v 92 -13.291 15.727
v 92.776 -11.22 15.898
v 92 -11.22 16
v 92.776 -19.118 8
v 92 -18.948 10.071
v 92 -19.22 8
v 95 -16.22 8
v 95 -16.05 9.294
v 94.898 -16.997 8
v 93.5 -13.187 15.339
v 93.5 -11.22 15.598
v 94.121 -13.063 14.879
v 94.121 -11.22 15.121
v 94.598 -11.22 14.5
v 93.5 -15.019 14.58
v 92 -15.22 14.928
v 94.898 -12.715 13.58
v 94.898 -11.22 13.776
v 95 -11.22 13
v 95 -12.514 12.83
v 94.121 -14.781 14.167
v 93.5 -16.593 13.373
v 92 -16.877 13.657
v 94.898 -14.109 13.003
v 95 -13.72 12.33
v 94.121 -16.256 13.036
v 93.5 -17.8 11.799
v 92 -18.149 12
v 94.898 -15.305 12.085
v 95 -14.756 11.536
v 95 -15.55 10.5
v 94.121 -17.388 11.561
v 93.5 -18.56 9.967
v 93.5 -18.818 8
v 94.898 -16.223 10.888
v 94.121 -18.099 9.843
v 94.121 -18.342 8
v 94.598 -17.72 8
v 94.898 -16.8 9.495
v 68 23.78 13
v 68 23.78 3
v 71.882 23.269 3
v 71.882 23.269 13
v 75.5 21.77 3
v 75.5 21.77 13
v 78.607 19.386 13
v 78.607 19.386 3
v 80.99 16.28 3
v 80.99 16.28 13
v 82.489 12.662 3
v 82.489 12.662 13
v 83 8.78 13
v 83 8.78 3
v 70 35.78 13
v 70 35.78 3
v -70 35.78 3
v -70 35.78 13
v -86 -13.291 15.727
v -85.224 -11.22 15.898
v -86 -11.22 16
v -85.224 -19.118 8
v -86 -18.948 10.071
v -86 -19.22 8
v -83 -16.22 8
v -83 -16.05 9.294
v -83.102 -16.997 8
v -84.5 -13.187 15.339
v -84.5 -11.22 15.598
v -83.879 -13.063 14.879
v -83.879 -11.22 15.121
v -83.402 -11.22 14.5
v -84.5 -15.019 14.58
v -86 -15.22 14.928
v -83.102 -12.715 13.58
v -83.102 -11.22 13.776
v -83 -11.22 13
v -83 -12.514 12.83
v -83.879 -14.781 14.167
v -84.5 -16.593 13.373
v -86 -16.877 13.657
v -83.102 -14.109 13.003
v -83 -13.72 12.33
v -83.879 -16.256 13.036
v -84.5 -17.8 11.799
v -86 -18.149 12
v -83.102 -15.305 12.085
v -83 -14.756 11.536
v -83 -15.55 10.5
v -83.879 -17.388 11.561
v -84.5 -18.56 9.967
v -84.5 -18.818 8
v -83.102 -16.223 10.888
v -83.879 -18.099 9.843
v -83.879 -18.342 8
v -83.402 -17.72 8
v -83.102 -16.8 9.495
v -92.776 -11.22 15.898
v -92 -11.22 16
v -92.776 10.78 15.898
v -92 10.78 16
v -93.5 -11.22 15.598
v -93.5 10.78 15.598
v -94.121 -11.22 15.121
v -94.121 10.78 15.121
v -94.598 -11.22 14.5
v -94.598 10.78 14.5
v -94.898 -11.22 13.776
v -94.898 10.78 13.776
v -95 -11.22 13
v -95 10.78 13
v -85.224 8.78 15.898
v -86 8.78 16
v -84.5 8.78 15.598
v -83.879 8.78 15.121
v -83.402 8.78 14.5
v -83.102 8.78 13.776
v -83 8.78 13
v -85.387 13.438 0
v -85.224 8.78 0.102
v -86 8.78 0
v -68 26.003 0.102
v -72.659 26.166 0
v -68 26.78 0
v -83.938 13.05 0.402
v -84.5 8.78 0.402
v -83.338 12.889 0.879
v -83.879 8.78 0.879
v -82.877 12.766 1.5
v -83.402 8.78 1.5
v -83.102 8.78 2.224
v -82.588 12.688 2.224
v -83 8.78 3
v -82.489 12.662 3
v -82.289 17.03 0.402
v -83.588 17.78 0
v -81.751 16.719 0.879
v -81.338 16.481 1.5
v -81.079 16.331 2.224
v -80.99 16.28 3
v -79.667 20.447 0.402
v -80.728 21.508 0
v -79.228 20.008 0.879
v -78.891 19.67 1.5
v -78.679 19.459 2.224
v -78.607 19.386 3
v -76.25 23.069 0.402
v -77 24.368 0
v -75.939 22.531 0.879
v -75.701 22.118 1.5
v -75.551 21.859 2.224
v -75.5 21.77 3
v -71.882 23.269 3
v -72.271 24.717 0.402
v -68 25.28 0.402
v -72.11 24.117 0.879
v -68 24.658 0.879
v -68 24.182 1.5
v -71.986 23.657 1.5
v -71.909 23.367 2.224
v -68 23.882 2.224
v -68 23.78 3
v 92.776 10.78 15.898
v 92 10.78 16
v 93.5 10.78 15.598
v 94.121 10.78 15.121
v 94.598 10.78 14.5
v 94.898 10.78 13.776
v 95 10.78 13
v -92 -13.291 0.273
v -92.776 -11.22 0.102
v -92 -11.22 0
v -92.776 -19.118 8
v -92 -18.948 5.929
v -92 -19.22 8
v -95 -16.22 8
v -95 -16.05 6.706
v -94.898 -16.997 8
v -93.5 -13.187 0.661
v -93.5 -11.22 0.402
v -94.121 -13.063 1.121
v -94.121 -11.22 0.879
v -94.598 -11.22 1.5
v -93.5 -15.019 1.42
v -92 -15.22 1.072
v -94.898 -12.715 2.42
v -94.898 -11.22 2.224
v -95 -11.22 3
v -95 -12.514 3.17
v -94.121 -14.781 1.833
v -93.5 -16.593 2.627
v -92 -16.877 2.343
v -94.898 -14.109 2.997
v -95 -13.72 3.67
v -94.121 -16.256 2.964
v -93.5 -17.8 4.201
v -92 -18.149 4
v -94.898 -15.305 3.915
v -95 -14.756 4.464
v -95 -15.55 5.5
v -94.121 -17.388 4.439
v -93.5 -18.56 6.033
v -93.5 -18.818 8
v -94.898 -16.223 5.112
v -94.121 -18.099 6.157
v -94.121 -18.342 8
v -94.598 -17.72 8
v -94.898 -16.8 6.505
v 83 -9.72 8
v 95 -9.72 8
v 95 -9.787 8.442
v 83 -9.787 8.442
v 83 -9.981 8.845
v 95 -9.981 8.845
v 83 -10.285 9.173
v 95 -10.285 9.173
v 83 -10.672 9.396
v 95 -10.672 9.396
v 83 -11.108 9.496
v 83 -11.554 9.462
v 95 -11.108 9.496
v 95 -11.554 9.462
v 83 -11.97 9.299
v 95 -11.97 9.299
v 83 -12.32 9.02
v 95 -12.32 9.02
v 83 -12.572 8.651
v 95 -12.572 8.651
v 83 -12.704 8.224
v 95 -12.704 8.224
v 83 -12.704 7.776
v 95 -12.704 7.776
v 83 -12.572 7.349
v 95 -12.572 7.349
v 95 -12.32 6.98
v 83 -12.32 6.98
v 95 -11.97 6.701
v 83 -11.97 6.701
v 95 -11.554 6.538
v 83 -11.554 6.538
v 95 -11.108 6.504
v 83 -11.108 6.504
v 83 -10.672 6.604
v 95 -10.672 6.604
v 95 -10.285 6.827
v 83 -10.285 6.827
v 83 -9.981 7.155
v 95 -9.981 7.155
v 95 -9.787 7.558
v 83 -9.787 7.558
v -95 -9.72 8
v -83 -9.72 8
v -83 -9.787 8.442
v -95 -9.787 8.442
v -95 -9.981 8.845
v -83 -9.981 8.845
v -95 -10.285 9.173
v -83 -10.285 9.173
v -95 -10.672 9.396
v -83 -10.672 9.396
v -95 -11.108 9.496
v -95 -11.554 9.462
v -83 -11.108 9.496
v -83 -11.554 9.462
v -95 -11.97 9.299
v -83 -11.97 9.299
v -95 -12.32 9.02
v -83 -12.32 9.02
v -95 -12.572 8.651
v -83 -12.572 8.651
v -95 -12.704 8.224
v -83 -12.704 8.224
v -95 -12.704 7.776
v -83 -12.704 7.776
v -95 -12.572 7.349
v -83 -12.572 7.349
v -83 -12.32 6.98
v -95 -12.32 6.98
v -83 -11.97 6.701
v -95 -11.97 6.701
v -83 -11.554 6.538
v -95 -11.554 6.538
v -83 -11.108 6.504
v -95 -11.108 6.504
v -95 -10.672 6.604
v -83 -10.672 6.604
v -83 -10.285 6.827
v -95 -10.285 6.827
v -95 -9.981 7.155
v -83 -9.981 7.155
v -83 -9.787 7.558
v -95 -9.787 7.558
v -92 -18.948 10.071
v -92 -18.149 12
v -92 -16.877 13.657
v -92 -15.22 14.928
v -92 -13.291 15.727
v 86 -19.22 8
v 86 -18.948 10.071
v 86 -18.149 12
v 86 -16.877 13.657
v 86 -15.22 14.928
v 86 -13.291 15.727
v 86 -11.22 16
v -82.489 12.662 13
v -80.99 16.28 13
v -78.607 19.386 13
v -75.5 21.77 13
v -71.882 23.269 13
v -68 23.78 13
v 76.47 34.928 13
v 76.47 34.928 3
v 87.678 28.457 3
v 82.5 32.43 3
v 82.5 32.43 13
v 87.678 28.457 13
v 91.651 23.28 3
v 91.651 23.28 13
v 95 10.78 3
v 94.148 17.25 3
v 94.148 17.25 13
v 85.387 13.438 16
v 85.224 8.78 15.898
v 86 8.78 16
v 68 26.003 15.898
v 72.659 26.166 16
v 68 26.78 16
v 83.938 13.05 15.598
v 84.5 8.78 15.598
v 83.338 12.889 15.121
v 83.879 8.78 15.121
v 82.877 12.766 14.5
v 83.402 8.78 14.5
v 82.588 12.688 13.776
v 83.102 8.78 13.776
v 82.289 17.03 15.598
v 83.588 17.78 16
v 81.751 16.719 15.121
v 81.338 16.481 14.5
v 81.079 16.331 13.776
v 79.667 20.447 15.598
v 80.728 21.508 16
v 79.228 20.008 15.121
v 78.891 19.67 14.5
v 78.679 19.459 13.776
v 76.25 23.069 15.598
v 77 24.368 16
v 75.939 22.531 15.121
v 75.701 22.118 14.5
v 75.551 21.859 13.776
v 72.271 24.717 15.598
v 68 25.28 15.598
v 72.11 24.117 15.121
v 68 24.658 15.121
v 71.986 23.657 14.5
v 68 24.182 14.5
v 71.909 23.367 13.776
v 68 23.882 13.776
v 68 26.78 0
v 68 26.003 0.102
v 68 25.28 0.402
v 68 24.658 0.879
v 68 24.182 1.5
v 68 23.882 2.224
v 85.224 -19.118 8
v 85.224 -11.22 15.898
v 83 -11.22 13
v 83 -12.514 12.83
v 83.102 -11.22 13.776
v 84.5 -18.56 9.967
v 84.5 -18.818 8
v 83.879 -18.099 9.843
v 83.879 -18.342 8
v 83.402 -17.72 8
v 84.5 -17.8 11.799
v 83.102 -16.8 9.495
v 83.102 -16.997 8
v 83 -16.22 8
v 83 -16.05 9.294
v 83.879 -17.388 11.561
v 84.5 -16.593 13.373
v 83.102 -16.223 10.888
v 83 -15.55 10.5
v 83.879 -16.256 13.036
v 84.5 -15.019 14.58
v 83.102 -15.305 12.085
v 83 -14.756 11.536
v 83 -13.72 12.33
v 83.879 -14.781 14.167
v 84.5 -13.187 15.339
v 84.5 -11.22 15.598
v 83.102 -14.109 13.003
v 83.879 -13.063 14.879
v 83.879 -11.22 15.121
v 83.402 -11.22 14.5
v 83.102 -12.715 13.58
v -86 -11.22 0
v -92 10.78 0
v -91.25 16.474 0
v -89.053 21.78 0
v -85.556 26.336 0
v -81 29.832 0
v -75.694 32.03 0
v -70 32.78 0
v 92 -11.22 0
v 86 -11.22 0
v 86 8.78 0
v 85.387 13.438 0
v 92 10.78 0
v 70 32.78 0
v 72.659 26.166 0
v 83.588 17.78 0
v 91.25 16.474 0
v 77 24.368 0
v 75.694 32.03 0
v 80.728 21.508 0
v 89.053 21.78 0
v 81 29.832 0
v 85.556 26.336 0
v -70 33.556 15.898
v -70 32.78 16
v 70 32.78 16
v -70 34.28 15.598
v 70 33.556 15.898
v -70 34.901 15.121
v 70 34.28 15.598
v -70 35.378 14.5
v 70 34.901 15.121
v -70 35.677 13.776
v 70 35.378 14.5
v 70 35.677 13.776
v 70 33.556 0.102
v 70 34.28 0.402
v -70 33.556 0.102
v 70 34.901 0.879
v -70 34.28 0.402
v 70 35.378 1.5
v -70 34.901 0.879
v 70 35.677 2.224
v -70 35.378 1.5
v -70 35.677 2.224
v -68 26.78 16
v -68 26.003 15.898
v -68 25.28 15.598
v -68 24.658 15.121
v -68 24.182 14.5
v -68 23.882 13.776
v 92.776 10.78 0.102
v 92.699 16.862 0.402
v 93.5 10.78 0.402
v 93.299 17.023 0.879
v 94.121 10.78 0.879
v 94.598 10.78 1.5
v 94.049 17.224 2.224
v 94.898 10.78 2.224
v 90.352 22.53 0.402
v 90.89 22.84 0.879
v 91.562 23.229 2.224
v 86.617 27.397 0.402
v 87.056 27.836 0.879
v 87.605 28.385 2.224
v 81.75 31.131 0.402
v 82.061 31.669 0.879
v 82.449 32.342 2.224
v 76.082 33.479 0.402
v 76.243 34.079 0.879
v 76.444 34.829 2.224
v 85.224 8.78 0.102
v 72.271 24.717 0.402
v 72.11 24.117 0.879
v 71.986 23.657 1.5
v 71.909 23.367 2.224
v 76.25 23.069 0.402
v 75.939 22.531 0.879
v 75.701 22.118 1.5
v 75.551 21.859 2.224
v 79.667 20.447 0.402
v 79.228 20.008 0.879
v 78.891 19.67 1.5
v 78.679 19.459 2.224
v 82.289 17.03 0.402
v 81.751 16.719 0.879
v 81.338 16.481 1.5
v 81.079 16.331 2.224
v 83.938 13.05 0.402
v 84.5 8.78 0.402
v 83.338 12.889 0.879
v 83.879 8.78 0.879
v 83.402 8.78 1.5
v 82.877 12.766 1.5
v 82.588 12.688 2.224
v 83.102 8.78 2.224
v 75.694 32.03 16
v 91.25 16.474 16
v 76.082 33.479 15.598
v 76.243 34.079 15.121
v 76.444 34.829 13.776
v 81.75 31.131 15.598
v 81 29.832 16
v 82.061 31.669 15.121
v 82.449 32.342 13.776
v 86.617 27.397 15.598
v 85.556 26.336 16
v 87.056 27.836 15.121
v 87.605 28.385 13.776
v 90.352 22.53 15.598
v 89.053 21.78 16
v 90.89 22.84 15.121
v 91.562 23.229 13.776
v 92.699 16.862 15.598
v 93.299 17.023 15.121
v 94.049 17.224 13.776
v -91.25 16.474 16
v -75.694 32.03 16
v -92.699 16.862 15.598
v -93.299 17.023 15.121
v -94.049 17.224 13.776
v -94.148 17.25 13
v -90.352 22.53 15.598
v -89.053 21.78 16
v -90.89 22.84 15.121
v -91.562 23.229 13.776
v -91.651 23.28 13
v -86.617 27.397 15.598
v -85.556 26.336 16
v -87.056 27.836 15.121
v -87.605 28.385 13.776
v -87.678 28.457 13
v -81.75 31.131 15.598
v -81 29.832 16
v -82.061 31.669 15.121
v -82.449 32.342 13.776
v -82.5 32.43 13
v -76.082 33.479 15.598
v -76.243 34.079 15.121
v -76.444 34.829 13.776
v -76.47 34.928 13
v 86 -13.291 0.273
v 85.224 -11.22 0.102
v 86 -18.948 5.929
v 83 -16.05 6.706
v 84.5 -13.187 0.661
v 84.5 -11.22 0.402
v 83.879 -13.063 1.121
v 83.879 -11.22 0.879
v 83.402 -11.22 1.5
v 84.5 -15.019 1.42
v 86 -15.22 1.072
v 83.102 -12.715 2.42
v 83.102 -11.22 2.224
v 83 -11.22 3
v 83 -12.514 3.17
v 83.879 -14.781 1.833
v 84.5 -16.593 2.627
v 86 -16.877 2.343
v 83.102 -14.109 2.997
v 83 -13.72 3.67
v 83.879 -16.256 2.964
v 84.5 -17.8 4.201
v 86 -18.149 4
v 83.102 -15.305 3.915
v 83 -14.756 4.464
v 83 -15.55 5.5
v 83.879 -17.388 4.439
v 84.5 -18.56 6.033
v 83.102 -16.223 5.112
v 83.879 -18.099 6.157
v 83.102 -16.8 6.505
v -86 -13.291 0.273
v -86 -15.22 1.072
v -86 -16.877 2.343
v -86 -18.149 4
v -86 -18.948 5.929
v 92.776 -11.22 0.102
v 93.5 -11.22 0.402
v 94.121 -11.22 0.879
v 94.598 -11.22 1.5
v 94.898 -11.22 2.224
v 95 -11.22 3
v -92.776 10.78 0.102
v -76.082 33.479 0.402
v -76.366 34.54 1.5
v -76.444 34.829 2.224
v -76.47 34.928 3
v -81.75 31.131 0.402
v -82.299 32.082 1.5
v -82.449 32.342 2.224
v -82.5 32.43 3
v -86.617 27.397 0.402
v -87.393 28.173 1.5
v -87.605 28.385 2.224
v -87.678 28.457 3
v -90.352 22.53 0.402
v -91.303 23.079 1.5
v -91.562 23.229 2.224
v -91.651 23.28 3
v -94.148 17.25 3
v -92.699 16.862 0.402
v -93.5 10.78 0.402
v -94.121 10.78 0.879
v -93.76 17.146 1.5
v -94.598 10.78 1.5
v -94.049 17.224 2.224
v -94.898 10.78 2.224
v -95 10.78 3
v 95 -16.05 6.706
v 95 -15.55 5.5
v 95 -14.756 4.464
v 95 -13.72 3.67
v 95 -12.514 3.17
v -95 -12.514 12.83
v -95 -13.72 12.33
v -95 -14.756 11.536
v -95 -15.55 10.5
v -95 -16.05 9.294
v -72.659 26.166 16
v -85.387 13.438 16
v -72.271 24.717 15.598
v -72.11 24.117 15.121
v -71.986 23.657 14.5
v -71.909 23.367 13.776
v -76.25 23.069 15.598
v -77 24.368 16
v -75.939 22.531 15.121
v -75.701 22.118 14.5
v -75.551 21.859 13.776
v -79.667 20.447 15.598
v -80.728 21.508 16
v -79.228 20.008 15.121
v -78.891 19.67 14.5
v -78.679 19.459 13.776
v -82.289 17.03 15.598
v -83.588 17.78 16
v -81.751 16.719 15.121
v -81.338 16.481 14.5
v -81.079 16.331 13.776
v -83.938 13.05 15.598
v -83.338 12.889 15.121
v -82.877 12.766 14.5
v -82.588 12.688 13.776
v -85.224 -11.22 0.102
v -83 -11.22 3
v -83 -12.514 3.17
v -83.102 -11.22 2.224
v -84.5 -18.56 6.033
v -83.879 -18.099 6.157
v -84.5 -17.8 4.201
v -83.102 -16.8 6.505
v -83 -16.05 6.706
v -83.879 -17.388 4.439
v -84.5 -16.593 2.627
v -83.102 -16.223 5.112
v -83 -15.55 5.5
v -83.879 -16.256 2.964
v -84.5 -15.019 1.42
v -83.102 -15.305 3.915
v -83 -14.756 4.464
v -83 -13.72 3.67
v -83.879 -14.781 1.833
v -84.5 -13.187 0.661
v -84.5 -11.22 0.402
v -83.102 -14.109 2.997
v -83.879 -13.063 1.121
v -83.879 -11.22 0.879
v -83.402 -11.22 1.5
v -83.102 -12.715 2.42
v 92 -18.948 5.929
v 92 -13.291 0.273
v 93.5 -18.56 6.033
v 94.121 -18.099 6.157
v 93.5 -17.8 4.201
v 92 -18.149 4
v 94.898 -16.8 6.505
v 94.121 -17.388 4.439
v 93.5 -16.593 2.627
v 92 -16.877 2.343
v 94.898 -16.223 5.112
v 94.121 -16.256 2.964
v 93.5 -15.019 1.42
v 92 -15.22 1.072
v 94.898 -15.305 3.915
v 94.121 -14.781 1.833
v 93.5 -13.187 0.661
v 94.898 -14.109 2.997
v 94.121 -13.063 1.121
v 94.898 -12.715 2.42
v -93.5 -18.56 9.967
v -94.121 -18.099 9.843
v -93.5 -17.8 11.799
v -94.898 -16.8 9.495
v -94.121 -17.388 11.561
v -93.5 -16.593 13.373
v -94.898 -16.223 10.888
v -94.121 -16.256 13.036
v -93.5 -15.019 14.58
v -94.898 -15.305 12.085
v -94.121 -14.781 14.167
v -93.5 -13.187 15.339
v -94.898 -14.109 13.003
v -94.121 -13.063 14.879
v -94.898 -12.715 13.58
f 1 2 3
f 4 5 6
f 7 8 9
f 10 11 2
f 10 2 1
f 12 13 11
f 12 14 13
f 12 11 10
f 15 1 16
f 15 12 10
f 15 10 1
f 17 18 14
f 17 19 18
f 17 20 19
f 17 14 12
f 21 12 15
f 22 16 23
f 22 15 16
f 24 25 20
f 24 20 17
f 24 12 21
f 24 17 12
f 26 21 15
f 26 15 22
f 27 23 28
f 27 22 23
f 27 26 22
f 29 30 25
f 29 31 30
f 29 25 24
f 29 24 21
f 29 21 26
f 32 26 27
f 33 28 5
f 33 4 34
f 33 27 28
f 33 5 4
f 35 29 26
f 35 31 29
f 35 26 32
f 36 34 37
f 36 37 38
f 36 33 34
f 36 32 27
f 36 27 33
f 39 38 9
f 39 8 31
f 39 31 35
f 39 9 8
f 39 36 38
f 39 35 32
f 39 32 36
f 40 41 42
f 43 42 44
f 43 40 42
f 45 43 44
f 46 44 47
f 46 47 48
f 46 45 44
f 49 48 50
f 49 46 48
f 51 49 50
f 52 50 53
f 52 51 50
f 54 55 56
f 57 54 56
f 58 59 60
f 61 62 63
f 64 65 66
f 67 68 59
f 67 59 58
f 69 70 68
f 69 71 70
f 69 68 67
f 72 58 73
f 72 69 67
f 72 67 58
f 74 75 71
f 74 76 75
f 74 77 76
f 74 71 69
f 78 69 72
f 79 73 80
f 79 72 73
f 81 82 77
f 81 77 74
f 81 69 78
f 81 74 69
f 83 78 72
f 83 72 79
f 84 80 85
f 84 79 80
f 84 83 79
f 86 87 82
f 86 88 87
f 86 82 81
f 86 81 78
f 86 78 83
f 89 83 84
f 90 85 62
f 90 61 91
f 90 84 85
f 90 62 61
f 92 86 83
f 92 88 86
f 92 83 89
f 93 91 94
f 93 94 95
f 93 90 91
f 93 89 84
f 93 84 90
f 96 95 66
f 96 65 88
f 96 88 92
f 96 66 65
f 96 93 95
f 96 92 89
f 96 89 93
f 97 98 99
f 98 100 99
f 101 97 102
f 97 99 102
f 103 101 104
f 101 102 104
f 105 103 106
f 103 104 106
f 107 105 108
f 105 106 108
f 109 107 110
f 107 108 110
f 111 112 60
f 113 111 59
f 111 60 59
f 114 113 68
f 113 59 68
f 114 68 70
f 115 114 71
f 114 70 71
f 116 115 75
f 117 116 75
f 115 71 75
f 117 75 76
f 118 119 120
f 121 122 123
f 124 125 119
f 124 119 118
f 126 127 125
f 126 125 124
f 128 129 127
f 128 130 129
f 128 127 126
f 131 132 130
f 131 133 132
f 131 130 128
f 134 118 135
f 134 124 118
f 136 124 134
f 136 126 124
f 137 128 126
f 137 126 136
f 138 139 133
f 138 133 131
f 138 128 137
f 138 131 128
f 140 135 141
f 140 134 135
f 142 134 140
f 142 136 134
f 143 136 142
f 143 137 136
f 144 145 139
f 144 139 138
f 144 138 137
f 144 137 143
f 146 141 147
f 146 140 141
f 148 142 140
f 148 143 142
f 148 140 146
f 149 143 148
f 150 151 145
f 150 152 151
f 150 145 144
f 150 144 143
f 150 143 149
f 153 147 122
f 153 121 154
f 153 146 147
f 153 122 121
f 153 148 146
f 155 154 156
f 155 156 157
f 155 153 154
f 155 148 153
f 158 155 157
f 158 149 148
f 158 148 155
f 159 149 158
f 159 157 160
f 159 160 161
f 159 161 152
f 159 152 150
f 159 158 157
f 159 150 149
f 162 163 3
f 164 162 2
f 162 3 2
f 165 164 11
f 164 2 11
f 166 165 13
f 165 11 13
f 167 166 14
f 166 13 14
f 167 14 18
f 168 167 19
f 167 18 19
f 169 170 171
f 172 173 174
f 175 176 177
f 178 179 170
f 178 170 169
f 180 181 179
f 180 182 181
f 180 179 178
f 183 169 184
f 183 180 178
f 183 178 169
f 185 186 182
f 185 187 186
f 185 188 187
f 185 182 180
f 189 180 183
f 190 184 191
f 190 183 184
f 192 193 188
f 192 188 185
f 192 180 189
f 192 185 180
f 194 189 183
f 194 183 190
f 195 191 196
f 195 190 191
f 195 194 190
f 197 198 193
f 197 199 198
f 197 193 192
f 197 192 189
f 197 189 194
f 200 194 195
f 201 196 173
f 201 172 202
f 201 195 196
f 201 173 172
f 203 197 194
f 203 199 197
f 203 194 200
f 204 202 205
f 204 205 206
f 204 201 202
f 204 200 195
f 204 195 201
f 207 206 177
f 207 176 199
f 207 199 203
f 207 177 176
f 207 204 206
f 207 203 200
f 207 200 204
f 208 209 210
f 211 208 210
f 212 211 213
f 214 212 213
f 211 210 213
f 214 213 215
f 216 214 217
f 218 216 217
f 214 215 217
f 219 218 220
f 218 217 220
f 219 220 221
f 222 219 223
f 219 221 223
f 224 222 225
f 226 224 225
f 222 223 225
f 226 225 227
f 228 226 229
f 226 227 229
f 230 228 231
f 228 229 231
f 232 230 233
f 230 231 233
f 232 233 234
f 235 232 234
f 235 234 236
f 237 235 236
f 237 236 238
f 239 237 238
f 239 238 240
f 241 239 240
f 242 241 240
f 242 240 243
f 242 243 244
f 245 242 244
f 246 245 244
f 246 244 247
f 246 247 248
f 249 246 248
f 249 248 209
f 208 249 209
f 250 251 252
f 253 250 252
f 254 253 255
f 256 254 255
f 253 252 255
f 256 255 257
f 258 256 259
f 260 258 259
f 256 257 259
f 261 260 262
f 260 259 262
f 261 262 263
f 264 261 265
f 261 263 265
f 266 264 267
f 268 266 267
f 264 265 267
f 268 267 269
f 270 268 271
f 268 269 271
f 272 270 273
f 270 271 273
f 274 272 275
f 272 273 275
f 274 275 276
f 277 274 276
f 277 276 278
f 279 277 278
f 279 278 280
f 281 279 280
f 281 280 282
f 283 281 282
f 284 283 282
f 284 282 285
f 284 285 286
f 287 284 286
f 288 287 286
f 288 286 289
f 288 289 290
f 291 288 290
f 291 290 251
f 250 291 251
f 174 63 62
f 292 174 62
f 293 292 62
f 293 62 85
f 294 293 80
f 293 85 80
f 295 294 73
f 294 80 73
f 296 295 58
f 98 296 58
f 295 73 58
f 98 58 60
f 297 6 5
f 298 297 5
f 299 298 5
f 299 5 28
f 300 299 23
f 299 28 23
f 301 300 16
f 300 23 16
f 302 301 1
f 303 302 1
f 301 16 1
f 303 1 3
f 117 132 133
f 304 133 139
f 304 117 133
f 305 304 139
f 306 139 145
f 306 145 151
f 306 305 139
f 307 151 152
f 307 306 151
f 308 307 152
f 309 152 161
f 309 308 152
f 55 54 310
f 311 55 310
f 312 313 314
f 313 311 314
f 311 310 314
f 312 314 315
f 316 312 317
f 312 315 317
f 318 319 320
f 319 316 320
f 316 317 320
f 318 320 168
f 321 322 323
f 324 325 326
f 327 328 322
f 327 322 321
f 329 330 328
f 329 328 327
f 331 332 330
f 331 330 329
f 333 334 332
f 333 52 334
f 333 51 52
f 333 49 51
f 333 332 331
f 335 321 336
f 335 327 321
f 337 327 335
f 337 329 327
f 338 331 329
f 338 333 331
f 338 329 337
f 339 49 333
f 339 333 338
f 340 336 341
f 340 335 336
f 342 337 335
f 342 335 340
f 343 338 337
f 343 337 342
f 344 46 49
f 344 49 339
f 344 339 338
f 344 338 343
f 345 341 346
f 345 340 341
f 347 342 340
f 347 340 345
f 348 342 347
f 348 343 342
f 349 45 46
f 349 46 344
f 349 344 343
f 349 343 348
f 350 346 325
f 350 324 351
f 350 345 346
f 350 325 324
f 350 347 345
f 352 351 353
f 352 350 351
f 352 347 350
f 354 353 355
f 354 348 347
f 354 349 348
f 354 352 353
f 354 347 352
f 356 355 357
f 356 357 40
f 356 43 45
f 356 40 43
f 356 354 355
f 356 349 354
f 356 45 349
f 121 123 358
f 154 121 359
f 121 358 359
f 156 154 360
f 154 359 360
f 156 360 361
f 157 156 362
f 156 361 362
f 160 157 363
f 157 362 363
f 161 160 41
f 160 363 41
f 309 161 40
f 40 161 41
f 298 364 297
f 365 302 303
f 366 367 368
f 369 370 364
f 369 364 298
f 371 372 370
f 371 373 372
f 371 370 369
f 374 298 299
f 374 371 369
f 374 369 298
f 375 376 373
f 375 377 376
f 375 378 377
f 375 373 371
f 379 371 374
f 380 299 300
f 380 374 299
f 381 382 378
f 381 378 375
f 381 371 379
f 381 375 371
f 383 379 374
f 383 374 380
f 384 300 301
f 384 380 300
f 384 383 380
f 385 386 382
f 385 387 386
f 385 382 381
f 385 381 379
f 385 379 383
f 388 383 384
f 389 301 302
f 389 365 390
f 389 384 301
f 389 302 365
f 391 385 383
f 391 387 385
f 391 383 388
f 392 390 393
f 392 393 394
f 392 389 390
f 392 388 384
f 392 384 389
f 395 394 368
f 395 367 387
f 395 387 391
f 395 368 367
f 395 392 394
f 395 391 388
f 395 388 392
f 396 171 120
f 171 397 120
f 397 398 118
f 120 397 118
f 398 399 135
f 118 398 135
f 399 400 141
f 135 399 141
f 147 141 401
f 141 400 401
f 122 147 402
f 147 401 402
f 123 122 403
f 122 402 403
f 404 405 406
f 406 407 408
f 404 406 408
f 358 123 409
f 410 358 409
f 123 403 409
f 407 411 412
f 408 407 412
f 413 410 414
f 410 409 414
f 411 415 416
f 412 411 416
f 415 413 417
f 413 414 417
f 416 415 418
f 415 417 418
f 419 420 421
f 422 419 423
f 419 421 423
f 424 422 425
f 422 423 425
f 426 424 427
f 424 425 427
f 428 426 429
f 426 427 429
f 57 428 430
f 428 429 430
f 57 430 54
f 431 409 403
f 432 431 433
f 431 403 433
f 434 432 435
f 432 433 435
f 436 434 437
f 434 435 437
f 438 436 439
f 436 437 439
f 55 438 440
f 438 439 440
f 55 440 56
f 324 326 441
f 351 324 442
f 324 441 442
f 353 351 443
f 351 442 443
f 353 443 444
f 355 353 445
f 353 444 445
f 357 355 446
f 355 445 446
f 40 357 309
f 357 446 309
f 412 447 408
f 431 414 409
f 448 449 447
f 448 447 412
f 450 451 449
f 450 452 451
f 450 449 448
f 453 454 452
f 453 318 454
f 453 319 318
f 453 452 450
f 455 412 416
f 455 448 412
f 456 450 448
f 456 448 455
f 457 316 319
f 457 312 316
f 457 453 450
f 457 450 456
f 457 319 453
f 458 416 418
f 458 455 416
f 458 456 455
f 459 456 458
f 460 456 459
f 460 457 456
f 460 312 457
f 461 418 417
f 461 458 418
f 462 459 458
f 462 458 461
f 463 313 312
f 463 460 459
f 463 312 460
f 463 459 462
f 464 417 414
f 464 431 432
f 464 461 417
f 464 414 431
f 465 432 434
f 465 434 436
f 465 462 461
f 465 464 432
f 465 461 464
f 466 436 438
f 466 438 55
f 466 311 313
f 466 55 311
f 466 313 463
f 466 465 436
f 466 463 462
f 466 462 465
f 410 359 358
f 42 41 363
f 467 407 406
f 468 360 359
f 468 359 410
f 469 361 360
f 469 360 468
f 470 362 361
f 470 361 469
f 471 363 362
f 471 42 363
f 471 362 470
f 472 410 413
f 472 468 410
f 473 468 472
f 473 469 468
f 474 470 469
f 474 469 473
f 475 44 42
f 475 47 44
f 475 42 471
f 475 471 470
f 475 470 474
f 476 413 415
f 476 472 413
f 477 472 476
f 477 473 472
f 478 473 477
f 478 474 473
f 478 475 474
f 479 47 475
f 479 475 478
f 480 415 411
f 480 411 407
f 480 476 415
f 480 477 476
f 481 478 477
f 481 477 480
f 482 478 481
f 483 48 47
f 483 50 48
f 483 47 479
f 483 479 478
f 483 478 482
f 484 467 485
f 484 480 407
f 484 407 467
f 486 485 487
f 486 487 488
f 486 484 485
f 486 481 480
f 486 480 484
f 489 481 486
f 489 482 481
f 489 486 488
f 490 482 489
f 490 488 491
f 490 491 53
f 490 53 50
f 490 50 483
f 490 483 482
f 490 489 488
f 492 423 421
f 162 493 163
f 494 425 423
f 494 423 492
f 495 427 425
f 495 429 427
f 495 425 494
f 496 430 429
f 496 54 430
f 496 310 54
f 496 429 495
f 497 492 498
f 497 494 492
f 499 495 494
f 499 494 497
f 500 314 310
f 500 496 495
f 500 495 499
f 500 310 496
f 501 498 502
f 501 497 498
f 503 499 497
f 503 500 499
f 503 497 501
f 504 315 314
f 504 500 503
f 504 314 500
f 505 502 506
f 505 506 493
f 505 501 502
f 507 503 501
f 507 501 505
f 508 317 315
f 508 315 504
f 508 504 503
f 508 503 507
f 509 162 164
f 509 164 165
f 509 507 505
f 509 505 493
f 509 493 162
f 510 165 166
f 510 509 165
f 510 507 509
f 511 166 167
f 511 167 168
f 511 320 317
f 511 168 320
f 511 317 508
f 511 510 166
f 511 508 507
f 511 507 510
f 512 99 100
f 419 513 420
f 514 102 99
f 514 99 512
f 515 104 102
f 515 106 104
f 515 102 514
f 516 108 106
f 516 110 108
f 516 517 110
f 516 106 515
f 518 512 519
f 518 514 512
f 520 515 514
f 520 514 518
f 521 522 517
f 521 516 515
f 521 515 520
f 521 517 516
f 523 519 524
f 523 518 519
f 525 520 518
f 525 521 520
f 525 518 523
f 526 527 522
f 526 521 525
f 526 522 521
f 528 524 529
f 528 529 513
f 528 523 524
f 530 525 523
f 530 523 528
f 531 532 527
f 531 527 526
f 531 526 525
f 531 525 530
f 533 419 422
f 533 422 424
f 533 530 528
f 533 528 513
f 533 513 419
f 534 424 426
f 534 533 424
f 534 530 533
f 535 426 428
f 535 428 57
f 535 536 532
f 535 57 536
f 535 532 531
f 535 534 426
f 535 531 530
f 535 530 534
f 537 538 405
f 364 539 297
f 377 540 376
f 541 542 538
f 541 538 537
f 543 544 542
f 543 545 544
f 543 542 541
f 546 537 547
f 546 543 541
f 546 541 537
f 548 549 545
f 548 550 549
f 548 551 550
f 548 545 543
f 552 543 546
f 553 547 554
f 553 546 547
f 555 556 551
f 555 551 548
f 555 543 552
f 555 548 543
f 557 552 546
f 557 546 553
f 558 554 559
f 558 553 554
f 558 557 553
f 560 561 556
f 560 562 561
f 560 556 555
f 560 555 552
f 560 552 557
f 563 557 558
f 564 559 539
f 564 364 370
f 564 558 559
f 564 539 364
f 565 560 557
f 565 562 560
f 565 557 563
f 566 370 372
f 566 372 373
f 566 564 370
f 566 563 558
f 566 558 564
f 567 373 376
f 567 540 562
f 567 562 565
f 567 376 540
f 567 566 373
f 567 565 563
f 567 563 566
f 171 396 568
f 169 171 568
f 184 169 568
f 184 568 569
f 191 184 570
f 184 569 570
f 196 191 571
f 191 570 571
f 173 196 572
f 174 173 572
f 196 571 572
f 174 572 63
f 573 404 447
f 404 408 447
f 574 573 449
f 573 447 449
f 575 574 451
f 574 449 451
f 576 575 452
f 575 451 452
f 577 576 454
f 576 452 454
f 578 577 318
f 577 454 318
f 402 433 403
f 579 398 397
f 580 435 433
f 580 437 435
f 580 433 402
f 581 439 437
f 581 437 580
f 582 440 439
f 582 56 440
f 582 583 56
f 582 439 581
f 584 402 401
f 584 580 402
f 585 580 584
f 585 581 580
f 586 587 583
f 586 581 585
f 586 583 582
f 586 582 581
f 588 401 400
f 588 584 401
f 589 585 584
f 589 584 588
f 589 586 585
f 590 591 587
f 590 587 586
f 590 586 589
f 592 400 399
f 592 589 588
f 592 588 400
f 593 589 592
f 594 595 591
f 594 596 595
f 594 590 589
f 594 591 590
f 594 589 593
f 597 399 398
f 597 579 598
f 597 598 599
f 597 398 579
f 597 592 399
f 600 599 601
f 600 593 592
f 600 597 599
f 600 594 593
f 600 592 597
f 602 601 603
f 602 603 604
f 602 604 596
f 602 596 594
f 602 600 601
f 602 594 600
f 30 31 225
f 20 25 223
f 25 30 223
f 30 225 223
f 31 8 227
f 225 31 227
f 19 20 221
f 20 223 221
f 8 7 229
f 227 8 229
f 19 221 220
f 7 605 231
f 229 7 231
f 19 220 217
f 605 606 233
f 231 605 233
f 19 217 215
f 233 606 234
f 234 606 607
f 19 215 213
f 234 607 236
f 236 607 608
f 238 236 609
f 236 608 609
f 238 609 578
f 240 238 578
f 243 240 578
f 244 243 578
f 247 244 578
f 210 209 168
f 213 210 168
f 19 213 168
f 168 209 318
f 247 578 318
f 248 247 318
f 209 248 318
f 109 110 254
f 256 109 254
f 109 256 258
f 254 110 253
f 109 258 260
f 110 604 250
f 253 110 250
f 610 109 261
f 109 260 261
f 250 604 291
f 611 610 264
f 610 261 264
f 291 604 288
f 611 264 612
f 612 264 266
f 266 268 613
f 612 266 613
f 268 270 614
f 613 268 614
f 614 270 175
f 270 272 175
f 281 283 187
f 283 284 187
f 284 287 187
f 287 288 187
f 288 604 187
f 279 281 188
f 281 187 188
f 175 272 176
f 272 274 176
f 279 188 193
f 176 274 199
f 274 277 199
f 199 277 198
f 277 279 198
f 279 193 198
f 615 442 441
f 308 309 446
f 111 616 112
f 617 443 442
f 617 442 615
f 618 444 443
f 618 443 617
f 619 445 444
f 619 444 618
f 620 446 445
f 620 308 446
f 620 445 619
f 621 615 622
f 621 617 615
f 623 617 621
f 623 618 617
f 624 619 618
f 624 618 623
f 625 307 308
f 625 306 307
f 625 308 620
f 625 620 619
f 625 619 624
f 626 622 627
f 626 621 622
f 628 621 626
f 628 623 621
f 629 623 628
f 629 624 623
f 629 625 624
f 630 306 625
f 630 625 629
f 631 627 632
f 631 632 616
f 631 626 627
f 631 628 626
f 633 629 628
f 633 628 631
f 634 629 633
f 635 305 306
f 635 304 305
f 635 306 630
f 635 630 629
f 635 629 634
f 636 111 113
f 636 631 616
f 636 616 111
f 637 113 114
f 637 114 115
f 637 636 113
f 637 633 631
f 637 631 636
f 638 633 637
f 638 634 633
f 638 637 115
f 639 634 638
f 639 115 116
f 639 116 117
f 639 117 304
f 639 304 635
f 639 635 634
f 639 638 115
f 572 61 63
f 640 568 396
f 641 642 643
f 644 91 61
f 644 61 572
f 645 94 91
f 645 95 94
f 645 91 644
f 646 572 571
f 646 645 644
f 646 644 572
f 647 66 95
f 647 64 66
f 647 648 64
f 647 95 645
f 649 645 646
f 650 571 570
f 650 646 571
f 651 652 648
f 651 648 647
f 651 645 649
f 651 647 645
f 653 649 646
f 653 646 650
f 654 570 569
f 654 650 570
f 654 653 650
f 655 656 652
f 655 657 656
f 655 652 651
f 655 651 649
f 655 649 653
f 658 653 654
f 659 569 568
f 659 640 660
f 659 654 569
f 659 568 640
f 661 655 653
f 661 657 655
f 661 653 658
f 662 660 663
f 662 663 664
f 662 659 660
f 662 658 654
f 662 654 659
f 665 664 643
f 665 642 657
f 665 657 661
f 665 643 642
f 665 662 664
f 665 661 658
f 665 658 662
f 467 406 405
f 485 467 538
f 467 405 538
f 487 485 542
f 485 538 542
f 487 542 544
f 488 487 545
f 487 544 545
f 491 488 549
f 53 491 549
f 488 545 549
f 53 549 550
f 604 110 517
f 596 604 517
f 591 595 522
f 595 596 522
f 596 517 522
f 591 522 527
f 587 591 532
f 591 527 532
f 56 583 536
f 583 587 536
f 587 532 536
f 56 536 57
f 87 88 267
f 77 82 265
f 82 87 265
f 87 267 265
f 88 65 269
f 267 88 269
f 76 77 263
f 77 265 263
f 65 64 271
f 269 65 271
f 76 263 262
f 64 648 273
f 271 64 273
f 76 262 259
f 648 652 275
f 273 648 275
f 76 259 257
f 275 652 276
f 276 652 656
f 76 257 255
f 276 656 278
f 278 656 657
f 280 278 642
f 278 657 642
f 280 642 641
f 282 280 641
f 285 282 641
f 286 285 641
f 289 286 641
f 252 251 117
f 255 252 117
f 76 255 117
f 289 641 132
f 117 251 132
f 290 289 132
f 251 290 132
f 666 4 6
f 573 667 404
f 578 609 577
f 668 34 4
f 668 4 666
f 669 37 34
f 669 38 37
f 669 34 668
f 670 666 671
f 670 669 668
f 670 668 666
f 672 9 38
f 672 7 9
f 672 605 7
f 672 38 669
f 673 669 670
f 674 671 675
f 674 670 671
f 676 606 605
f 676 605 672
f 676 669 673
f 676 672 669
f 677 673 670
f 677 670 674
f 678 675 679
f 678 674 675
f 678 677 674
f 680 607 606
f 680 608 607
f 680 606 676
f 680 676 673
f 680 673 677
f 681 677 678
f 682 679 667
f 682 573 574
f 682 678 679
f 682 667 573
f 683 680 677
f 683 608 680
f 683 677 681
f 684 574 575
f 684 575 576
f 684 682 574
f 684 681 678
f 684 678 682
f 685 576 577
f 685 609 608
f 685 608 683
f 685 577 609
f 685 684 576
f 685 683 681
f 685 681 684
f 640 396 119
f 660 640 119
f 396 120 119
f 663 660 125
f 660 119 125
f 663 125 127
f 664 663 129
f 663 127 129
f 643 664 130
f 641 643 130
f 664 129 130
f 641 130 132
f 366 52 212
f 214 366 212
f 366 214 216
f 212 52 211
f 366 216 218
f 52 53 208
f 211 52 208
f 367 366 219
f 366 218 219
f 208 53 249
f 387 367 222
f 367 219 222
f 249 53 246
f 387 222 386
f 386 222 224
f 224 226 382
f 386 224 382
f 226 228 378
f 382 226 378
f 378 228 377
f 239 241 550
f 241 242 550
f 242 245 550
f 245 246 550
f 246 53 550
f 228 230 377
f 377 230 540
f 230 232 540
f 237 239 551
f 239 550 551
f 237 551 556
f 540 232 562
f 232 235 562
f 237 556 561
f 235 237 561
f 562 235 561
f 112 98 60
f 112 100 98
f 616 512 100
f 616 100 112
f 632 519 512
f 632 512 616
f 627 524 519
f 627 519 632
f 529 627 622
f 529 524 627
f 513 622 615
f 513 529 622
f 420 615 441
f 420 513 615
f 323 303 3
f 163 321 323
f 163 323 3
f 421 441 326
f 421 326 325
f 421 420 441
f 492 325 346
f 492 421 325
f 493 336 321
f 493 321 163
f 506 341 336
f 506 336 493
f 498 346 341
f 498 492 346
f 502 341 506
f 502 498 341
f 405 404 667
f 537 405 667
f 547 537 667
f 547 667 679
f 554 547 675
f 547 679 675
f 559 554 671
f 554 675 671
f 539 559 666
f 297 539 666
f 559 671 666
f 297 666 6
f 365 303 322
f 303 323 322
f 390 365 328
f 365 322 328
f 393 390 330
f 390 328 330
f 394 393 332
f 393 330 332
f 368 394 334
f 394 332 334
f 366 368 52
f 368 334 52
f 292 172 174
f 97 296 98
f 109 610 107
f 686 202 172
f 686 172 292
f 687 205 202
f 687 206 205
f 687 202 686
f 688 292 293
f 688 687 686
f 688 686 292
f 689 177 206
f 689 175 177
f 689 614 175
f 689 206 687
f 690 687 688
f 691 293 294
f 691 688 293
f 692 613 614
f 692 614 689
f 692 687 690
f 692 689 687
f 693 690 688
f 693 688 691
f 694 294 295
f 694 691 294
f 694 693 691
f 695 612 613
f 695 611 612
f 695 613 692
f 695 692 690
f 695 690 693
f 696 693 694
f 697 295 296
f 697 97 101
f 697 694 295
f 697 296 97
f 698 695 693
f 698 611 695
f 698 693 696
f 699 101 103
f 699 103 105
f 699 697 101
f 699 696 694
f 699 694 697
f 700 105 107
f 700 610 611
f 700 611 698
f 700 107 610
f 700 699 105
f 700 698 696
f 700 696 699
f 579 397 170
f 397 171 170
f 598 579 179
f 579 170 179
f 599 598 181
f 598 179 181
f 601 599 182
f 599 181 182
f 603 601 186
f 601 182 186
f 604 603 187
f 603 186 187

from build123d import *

# Parameters (mm, degrees)
F1_DEPTH = 16
F2_R     = 15
F3_R     = 25
F4_R     = 7.99999
F5_R     = 1.5
F6_DEPTH = 250
F7_R     = 3


# Not quite as in the source:
# - a fillet or chamfer is up to 0.001 mm smaller than in the source, because OpenCascade refuses the exact size


with BuildPart() as f1:
    # F0 (on Top) → F1 (new body)
    with BuildSketch(Plane.XY):
        Polygon((95, 35.7796452148), (0, 35.7796452148), (-95, 35.7796452148), (-95, -19.2203547852), (-83, -19.2203547852), (-83, 23.7796452148), (0, 23.7796452148), (83, 23.7796452148), (83, -19.2203547852), (95, -19.2203547852), align=None)
    extrude(amount=F1_DEPTH)

    # F2
    f2_edges = [f1.edges().sort_by_distance(p)[0] for p in [
        (-83, 23.779645, 8),
        (83, 23.779645, 8),
    ]]
    fillet(f2_edges, radius=F2_R)

    # F3
    f3_edges = [f1.edges().sort_by_distance(p)[0] for p in [
        (-95, 35.779645, 8),
        (95, 35.779645, 8),
    ]]
    fillet(f3_edges, radius=F3_R)

    # F4 (radius 8 in the source; OpenCascade refuses exactly that, so slightly less here)
    f4_edges = [f1.edges().sort_by_distance(p)[0] for p in [
        (-89, -19.220355, 16),
        (-89, -19.220355, 0),
        (89, -19.220355, 16),
        (89, -19.220355, 0),
    ]]
    fillet(f4_edges, radius=F4_R)

    # F5 (on face) → F6 (cut)
    with BuildSketch(Plane.YZ.offset(95)):
        with Locations((-11.2203547852, 8)):
            Circle(F5_R)
    extrude(amount=-F6_DEPTH, mode=Mode.SUBTRACT)

    # F7
    f7_edges = [f1.edges().sort_by_distance(p)[0] for p in [
        (-95, -0.22036, 0),
        (-89, -11.220365, 0),
        (-87.67767, 28.457315, 0),
        (-83, -1.22036, 0),
        (0, 35.779645, 0),
        (-78.606602, 19.386247, 0),
        (87.67767, 28.457315, 0),
        (0, 23.779645, 0),
        (95, -0.22036, 0),
        (78.606602, 19.386247, 0),
        (89, -11.220365, 0),
        (83, -1.22036, 0),
    ]]
    fillet(f7_edges, radius=F7_R)


solid = f1.part
